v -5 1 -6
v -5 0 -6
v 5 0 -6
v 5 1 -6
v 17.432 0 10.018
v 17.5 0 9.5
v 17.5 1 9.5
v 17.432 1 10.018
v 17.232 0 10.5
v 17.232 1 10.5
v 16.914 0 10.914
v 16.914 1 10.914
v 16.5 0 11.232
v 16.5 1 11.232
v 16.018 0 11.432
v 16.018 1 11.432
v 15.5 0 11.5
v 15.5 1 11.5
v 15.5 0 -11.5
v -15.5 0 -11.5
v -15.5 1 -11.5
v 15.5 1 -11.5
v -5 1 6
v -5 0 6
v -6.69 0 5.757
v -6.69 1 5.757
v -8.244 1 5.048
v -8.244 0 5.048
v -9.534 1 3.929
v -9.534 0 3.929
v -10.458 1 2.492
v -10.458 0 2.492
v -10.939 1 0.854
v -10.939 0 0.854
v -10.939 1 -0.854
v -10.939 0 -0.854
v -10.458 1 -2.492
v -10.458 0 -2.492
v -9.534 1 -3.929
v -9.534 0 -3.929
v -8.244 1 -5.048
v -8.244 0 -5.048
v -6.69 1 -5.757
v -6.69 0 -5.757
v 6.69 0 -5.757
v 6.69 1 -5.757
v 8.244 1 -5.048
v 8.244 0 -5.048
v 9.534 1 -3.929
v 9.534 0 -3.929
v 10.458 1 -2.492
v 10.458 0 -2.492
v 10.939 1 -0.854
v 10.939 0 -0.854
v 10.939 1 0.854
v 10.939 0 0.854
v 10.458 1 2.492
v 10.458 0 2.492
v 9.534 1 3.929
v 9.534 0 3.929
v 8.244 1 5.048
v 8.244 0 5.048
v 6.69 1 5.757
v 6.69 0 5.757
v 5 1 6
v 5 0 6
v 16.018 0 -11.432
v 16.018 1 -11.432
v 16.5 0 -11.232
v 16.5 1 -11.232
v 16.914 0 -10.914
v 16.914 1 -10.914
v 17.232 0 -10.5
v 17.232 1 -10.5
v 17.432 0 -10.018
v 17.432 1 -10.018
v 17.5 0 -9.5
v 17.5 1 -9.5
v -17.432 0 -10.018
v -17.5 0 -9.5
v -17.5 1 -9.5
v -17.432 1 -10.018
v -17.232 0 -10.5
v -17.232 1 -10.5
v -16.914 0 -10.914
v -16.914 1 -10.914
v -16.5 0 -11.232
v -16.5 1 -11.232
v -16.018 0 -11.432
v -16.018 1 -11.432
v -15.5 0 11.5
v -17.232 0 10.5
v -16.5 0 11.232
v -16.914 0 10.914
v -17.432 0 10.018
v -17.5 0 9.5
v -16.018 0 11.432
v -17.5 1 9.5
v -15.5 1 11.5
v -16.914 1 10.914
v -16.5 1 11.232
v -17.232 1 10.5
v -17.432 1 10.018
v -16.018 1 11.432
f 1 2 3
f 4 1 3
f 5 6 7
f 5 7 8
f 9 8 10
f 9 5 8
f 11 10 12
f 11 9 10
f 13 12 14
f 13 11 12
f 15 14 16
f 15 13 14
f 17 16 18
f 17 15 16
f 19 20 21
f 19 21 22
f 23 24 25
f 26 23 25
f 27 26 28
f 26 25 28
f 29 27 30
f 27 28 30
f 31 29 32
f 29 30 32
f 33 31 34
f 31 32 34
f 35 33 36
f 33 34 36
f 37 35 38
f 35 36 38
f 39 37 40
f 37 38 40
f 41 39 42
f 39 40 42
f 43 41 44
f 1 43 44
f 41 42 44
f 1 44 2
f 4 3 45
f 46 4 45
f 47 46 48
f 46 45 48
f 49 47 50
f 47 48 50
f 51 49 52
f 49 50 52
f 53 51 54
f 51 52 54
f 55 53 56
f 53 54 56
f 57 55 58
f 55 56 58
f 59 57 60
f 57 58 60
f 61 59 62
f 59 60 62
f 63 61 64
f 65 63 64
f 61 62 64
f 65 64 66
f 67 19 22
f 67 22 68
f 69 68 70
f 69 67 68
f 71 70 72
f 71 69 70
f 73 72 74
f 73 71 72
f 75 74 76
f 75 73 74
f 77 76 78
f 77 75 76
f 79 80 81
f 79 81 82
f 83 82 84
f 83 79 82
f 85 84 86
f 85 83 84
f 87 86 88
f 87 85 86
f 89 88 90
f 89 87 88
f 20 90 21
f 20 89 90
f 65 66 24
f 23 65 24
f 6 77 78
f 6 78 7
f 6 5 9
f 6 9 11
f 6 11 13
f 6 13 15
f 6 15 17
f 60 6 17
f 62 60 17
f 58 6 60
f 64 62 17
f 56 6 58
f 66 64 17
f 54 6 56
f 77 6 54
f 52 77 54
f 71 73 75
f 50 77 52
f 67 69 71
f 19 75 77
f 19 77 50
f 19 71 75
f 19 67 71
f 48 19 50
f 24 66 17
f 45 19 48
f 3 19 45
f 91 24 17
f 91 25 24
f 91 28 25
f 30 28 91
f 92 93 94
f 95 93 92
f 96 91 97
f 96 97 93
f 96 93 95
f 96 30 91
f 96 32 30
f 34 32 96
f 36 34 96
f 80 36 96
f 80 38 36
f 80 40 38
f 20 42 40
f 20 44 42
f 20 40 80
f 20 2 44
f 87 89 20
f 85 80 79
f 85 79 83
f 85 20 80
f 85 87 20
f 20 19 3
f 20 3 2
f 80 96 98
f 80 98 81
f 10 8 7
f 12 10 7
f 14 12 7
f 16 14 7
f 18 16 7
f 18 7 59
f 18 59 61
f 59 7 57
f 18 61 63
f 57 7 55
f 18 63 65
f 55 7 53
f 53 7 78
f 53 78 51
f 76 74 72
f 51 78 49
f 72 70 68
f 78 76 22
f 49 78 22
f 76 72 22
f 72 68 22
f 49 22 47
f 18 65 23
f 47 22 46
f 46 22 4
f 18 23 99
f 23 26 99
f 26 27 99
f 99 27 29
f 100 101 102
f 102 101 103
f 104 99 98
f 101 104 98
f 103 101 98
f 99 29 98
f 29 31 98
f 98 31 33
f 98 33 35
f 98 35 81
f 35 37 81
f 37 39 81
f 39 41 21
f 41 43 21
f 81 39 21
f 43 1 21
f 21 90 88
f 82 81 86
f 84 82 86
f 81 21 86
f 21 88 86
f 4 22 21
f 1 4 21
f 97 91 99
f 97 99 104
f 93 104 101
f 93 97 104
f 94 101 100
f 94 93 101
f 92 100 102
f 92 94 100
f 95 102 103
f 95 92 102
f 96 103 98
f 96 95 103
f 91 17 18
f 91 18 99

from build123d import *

# Parameters (mm, degrees)
EXTRUDE_1_DEPTH = 1


with BuildPart() as part:
    # Эскиз1 → Бобышка-Вытянуть1 (new body)
    with BuildSketch(Plane(origin=(0, 0, 0), x_dir=(1, 0, 0), z_dir=(0, 1, 0))):
        with BuildLine():
            Line((15.5, -11.5), (-15.5, -11.5))
            ThreePointArc((-15.5, -11.5), (-16.914213562, -10.914213562), (-17.5, -9.5))
            Line((-17.5, -9.5), (-17.5, 9.5))
            ThreePointArc((-17.5, 9.5), (-16.914213562, 10.914213562), (-15.5, 11.5))
            Line((-15.5, 11.5), (15.5, 11.5))
            ThreePointArc((15.5, 11.5), (16.914213562, 10.914213562), (17.5, 9.5))
            Line((17.5, 9.5), (17.5, -9.5))
            ThreePointArc((17.5, -9.5), (16.914213562, -10.914213562), (15.5, -11.5))
        make_face()
        with BuildLine():
            Line((-5, 6), (5, 6))
            ThreePointArc((5, 6), (11, 0), (5, -6))
            Line((5, -6), (-5, -6))
            ThreePointArc((-5, -6), (-11, 0), (-5, 6))
        make_face(mode=Mode.SUBTRACT)
    extrude(amount=EXTRUDE_1_DEPTH)


solid = part.part
